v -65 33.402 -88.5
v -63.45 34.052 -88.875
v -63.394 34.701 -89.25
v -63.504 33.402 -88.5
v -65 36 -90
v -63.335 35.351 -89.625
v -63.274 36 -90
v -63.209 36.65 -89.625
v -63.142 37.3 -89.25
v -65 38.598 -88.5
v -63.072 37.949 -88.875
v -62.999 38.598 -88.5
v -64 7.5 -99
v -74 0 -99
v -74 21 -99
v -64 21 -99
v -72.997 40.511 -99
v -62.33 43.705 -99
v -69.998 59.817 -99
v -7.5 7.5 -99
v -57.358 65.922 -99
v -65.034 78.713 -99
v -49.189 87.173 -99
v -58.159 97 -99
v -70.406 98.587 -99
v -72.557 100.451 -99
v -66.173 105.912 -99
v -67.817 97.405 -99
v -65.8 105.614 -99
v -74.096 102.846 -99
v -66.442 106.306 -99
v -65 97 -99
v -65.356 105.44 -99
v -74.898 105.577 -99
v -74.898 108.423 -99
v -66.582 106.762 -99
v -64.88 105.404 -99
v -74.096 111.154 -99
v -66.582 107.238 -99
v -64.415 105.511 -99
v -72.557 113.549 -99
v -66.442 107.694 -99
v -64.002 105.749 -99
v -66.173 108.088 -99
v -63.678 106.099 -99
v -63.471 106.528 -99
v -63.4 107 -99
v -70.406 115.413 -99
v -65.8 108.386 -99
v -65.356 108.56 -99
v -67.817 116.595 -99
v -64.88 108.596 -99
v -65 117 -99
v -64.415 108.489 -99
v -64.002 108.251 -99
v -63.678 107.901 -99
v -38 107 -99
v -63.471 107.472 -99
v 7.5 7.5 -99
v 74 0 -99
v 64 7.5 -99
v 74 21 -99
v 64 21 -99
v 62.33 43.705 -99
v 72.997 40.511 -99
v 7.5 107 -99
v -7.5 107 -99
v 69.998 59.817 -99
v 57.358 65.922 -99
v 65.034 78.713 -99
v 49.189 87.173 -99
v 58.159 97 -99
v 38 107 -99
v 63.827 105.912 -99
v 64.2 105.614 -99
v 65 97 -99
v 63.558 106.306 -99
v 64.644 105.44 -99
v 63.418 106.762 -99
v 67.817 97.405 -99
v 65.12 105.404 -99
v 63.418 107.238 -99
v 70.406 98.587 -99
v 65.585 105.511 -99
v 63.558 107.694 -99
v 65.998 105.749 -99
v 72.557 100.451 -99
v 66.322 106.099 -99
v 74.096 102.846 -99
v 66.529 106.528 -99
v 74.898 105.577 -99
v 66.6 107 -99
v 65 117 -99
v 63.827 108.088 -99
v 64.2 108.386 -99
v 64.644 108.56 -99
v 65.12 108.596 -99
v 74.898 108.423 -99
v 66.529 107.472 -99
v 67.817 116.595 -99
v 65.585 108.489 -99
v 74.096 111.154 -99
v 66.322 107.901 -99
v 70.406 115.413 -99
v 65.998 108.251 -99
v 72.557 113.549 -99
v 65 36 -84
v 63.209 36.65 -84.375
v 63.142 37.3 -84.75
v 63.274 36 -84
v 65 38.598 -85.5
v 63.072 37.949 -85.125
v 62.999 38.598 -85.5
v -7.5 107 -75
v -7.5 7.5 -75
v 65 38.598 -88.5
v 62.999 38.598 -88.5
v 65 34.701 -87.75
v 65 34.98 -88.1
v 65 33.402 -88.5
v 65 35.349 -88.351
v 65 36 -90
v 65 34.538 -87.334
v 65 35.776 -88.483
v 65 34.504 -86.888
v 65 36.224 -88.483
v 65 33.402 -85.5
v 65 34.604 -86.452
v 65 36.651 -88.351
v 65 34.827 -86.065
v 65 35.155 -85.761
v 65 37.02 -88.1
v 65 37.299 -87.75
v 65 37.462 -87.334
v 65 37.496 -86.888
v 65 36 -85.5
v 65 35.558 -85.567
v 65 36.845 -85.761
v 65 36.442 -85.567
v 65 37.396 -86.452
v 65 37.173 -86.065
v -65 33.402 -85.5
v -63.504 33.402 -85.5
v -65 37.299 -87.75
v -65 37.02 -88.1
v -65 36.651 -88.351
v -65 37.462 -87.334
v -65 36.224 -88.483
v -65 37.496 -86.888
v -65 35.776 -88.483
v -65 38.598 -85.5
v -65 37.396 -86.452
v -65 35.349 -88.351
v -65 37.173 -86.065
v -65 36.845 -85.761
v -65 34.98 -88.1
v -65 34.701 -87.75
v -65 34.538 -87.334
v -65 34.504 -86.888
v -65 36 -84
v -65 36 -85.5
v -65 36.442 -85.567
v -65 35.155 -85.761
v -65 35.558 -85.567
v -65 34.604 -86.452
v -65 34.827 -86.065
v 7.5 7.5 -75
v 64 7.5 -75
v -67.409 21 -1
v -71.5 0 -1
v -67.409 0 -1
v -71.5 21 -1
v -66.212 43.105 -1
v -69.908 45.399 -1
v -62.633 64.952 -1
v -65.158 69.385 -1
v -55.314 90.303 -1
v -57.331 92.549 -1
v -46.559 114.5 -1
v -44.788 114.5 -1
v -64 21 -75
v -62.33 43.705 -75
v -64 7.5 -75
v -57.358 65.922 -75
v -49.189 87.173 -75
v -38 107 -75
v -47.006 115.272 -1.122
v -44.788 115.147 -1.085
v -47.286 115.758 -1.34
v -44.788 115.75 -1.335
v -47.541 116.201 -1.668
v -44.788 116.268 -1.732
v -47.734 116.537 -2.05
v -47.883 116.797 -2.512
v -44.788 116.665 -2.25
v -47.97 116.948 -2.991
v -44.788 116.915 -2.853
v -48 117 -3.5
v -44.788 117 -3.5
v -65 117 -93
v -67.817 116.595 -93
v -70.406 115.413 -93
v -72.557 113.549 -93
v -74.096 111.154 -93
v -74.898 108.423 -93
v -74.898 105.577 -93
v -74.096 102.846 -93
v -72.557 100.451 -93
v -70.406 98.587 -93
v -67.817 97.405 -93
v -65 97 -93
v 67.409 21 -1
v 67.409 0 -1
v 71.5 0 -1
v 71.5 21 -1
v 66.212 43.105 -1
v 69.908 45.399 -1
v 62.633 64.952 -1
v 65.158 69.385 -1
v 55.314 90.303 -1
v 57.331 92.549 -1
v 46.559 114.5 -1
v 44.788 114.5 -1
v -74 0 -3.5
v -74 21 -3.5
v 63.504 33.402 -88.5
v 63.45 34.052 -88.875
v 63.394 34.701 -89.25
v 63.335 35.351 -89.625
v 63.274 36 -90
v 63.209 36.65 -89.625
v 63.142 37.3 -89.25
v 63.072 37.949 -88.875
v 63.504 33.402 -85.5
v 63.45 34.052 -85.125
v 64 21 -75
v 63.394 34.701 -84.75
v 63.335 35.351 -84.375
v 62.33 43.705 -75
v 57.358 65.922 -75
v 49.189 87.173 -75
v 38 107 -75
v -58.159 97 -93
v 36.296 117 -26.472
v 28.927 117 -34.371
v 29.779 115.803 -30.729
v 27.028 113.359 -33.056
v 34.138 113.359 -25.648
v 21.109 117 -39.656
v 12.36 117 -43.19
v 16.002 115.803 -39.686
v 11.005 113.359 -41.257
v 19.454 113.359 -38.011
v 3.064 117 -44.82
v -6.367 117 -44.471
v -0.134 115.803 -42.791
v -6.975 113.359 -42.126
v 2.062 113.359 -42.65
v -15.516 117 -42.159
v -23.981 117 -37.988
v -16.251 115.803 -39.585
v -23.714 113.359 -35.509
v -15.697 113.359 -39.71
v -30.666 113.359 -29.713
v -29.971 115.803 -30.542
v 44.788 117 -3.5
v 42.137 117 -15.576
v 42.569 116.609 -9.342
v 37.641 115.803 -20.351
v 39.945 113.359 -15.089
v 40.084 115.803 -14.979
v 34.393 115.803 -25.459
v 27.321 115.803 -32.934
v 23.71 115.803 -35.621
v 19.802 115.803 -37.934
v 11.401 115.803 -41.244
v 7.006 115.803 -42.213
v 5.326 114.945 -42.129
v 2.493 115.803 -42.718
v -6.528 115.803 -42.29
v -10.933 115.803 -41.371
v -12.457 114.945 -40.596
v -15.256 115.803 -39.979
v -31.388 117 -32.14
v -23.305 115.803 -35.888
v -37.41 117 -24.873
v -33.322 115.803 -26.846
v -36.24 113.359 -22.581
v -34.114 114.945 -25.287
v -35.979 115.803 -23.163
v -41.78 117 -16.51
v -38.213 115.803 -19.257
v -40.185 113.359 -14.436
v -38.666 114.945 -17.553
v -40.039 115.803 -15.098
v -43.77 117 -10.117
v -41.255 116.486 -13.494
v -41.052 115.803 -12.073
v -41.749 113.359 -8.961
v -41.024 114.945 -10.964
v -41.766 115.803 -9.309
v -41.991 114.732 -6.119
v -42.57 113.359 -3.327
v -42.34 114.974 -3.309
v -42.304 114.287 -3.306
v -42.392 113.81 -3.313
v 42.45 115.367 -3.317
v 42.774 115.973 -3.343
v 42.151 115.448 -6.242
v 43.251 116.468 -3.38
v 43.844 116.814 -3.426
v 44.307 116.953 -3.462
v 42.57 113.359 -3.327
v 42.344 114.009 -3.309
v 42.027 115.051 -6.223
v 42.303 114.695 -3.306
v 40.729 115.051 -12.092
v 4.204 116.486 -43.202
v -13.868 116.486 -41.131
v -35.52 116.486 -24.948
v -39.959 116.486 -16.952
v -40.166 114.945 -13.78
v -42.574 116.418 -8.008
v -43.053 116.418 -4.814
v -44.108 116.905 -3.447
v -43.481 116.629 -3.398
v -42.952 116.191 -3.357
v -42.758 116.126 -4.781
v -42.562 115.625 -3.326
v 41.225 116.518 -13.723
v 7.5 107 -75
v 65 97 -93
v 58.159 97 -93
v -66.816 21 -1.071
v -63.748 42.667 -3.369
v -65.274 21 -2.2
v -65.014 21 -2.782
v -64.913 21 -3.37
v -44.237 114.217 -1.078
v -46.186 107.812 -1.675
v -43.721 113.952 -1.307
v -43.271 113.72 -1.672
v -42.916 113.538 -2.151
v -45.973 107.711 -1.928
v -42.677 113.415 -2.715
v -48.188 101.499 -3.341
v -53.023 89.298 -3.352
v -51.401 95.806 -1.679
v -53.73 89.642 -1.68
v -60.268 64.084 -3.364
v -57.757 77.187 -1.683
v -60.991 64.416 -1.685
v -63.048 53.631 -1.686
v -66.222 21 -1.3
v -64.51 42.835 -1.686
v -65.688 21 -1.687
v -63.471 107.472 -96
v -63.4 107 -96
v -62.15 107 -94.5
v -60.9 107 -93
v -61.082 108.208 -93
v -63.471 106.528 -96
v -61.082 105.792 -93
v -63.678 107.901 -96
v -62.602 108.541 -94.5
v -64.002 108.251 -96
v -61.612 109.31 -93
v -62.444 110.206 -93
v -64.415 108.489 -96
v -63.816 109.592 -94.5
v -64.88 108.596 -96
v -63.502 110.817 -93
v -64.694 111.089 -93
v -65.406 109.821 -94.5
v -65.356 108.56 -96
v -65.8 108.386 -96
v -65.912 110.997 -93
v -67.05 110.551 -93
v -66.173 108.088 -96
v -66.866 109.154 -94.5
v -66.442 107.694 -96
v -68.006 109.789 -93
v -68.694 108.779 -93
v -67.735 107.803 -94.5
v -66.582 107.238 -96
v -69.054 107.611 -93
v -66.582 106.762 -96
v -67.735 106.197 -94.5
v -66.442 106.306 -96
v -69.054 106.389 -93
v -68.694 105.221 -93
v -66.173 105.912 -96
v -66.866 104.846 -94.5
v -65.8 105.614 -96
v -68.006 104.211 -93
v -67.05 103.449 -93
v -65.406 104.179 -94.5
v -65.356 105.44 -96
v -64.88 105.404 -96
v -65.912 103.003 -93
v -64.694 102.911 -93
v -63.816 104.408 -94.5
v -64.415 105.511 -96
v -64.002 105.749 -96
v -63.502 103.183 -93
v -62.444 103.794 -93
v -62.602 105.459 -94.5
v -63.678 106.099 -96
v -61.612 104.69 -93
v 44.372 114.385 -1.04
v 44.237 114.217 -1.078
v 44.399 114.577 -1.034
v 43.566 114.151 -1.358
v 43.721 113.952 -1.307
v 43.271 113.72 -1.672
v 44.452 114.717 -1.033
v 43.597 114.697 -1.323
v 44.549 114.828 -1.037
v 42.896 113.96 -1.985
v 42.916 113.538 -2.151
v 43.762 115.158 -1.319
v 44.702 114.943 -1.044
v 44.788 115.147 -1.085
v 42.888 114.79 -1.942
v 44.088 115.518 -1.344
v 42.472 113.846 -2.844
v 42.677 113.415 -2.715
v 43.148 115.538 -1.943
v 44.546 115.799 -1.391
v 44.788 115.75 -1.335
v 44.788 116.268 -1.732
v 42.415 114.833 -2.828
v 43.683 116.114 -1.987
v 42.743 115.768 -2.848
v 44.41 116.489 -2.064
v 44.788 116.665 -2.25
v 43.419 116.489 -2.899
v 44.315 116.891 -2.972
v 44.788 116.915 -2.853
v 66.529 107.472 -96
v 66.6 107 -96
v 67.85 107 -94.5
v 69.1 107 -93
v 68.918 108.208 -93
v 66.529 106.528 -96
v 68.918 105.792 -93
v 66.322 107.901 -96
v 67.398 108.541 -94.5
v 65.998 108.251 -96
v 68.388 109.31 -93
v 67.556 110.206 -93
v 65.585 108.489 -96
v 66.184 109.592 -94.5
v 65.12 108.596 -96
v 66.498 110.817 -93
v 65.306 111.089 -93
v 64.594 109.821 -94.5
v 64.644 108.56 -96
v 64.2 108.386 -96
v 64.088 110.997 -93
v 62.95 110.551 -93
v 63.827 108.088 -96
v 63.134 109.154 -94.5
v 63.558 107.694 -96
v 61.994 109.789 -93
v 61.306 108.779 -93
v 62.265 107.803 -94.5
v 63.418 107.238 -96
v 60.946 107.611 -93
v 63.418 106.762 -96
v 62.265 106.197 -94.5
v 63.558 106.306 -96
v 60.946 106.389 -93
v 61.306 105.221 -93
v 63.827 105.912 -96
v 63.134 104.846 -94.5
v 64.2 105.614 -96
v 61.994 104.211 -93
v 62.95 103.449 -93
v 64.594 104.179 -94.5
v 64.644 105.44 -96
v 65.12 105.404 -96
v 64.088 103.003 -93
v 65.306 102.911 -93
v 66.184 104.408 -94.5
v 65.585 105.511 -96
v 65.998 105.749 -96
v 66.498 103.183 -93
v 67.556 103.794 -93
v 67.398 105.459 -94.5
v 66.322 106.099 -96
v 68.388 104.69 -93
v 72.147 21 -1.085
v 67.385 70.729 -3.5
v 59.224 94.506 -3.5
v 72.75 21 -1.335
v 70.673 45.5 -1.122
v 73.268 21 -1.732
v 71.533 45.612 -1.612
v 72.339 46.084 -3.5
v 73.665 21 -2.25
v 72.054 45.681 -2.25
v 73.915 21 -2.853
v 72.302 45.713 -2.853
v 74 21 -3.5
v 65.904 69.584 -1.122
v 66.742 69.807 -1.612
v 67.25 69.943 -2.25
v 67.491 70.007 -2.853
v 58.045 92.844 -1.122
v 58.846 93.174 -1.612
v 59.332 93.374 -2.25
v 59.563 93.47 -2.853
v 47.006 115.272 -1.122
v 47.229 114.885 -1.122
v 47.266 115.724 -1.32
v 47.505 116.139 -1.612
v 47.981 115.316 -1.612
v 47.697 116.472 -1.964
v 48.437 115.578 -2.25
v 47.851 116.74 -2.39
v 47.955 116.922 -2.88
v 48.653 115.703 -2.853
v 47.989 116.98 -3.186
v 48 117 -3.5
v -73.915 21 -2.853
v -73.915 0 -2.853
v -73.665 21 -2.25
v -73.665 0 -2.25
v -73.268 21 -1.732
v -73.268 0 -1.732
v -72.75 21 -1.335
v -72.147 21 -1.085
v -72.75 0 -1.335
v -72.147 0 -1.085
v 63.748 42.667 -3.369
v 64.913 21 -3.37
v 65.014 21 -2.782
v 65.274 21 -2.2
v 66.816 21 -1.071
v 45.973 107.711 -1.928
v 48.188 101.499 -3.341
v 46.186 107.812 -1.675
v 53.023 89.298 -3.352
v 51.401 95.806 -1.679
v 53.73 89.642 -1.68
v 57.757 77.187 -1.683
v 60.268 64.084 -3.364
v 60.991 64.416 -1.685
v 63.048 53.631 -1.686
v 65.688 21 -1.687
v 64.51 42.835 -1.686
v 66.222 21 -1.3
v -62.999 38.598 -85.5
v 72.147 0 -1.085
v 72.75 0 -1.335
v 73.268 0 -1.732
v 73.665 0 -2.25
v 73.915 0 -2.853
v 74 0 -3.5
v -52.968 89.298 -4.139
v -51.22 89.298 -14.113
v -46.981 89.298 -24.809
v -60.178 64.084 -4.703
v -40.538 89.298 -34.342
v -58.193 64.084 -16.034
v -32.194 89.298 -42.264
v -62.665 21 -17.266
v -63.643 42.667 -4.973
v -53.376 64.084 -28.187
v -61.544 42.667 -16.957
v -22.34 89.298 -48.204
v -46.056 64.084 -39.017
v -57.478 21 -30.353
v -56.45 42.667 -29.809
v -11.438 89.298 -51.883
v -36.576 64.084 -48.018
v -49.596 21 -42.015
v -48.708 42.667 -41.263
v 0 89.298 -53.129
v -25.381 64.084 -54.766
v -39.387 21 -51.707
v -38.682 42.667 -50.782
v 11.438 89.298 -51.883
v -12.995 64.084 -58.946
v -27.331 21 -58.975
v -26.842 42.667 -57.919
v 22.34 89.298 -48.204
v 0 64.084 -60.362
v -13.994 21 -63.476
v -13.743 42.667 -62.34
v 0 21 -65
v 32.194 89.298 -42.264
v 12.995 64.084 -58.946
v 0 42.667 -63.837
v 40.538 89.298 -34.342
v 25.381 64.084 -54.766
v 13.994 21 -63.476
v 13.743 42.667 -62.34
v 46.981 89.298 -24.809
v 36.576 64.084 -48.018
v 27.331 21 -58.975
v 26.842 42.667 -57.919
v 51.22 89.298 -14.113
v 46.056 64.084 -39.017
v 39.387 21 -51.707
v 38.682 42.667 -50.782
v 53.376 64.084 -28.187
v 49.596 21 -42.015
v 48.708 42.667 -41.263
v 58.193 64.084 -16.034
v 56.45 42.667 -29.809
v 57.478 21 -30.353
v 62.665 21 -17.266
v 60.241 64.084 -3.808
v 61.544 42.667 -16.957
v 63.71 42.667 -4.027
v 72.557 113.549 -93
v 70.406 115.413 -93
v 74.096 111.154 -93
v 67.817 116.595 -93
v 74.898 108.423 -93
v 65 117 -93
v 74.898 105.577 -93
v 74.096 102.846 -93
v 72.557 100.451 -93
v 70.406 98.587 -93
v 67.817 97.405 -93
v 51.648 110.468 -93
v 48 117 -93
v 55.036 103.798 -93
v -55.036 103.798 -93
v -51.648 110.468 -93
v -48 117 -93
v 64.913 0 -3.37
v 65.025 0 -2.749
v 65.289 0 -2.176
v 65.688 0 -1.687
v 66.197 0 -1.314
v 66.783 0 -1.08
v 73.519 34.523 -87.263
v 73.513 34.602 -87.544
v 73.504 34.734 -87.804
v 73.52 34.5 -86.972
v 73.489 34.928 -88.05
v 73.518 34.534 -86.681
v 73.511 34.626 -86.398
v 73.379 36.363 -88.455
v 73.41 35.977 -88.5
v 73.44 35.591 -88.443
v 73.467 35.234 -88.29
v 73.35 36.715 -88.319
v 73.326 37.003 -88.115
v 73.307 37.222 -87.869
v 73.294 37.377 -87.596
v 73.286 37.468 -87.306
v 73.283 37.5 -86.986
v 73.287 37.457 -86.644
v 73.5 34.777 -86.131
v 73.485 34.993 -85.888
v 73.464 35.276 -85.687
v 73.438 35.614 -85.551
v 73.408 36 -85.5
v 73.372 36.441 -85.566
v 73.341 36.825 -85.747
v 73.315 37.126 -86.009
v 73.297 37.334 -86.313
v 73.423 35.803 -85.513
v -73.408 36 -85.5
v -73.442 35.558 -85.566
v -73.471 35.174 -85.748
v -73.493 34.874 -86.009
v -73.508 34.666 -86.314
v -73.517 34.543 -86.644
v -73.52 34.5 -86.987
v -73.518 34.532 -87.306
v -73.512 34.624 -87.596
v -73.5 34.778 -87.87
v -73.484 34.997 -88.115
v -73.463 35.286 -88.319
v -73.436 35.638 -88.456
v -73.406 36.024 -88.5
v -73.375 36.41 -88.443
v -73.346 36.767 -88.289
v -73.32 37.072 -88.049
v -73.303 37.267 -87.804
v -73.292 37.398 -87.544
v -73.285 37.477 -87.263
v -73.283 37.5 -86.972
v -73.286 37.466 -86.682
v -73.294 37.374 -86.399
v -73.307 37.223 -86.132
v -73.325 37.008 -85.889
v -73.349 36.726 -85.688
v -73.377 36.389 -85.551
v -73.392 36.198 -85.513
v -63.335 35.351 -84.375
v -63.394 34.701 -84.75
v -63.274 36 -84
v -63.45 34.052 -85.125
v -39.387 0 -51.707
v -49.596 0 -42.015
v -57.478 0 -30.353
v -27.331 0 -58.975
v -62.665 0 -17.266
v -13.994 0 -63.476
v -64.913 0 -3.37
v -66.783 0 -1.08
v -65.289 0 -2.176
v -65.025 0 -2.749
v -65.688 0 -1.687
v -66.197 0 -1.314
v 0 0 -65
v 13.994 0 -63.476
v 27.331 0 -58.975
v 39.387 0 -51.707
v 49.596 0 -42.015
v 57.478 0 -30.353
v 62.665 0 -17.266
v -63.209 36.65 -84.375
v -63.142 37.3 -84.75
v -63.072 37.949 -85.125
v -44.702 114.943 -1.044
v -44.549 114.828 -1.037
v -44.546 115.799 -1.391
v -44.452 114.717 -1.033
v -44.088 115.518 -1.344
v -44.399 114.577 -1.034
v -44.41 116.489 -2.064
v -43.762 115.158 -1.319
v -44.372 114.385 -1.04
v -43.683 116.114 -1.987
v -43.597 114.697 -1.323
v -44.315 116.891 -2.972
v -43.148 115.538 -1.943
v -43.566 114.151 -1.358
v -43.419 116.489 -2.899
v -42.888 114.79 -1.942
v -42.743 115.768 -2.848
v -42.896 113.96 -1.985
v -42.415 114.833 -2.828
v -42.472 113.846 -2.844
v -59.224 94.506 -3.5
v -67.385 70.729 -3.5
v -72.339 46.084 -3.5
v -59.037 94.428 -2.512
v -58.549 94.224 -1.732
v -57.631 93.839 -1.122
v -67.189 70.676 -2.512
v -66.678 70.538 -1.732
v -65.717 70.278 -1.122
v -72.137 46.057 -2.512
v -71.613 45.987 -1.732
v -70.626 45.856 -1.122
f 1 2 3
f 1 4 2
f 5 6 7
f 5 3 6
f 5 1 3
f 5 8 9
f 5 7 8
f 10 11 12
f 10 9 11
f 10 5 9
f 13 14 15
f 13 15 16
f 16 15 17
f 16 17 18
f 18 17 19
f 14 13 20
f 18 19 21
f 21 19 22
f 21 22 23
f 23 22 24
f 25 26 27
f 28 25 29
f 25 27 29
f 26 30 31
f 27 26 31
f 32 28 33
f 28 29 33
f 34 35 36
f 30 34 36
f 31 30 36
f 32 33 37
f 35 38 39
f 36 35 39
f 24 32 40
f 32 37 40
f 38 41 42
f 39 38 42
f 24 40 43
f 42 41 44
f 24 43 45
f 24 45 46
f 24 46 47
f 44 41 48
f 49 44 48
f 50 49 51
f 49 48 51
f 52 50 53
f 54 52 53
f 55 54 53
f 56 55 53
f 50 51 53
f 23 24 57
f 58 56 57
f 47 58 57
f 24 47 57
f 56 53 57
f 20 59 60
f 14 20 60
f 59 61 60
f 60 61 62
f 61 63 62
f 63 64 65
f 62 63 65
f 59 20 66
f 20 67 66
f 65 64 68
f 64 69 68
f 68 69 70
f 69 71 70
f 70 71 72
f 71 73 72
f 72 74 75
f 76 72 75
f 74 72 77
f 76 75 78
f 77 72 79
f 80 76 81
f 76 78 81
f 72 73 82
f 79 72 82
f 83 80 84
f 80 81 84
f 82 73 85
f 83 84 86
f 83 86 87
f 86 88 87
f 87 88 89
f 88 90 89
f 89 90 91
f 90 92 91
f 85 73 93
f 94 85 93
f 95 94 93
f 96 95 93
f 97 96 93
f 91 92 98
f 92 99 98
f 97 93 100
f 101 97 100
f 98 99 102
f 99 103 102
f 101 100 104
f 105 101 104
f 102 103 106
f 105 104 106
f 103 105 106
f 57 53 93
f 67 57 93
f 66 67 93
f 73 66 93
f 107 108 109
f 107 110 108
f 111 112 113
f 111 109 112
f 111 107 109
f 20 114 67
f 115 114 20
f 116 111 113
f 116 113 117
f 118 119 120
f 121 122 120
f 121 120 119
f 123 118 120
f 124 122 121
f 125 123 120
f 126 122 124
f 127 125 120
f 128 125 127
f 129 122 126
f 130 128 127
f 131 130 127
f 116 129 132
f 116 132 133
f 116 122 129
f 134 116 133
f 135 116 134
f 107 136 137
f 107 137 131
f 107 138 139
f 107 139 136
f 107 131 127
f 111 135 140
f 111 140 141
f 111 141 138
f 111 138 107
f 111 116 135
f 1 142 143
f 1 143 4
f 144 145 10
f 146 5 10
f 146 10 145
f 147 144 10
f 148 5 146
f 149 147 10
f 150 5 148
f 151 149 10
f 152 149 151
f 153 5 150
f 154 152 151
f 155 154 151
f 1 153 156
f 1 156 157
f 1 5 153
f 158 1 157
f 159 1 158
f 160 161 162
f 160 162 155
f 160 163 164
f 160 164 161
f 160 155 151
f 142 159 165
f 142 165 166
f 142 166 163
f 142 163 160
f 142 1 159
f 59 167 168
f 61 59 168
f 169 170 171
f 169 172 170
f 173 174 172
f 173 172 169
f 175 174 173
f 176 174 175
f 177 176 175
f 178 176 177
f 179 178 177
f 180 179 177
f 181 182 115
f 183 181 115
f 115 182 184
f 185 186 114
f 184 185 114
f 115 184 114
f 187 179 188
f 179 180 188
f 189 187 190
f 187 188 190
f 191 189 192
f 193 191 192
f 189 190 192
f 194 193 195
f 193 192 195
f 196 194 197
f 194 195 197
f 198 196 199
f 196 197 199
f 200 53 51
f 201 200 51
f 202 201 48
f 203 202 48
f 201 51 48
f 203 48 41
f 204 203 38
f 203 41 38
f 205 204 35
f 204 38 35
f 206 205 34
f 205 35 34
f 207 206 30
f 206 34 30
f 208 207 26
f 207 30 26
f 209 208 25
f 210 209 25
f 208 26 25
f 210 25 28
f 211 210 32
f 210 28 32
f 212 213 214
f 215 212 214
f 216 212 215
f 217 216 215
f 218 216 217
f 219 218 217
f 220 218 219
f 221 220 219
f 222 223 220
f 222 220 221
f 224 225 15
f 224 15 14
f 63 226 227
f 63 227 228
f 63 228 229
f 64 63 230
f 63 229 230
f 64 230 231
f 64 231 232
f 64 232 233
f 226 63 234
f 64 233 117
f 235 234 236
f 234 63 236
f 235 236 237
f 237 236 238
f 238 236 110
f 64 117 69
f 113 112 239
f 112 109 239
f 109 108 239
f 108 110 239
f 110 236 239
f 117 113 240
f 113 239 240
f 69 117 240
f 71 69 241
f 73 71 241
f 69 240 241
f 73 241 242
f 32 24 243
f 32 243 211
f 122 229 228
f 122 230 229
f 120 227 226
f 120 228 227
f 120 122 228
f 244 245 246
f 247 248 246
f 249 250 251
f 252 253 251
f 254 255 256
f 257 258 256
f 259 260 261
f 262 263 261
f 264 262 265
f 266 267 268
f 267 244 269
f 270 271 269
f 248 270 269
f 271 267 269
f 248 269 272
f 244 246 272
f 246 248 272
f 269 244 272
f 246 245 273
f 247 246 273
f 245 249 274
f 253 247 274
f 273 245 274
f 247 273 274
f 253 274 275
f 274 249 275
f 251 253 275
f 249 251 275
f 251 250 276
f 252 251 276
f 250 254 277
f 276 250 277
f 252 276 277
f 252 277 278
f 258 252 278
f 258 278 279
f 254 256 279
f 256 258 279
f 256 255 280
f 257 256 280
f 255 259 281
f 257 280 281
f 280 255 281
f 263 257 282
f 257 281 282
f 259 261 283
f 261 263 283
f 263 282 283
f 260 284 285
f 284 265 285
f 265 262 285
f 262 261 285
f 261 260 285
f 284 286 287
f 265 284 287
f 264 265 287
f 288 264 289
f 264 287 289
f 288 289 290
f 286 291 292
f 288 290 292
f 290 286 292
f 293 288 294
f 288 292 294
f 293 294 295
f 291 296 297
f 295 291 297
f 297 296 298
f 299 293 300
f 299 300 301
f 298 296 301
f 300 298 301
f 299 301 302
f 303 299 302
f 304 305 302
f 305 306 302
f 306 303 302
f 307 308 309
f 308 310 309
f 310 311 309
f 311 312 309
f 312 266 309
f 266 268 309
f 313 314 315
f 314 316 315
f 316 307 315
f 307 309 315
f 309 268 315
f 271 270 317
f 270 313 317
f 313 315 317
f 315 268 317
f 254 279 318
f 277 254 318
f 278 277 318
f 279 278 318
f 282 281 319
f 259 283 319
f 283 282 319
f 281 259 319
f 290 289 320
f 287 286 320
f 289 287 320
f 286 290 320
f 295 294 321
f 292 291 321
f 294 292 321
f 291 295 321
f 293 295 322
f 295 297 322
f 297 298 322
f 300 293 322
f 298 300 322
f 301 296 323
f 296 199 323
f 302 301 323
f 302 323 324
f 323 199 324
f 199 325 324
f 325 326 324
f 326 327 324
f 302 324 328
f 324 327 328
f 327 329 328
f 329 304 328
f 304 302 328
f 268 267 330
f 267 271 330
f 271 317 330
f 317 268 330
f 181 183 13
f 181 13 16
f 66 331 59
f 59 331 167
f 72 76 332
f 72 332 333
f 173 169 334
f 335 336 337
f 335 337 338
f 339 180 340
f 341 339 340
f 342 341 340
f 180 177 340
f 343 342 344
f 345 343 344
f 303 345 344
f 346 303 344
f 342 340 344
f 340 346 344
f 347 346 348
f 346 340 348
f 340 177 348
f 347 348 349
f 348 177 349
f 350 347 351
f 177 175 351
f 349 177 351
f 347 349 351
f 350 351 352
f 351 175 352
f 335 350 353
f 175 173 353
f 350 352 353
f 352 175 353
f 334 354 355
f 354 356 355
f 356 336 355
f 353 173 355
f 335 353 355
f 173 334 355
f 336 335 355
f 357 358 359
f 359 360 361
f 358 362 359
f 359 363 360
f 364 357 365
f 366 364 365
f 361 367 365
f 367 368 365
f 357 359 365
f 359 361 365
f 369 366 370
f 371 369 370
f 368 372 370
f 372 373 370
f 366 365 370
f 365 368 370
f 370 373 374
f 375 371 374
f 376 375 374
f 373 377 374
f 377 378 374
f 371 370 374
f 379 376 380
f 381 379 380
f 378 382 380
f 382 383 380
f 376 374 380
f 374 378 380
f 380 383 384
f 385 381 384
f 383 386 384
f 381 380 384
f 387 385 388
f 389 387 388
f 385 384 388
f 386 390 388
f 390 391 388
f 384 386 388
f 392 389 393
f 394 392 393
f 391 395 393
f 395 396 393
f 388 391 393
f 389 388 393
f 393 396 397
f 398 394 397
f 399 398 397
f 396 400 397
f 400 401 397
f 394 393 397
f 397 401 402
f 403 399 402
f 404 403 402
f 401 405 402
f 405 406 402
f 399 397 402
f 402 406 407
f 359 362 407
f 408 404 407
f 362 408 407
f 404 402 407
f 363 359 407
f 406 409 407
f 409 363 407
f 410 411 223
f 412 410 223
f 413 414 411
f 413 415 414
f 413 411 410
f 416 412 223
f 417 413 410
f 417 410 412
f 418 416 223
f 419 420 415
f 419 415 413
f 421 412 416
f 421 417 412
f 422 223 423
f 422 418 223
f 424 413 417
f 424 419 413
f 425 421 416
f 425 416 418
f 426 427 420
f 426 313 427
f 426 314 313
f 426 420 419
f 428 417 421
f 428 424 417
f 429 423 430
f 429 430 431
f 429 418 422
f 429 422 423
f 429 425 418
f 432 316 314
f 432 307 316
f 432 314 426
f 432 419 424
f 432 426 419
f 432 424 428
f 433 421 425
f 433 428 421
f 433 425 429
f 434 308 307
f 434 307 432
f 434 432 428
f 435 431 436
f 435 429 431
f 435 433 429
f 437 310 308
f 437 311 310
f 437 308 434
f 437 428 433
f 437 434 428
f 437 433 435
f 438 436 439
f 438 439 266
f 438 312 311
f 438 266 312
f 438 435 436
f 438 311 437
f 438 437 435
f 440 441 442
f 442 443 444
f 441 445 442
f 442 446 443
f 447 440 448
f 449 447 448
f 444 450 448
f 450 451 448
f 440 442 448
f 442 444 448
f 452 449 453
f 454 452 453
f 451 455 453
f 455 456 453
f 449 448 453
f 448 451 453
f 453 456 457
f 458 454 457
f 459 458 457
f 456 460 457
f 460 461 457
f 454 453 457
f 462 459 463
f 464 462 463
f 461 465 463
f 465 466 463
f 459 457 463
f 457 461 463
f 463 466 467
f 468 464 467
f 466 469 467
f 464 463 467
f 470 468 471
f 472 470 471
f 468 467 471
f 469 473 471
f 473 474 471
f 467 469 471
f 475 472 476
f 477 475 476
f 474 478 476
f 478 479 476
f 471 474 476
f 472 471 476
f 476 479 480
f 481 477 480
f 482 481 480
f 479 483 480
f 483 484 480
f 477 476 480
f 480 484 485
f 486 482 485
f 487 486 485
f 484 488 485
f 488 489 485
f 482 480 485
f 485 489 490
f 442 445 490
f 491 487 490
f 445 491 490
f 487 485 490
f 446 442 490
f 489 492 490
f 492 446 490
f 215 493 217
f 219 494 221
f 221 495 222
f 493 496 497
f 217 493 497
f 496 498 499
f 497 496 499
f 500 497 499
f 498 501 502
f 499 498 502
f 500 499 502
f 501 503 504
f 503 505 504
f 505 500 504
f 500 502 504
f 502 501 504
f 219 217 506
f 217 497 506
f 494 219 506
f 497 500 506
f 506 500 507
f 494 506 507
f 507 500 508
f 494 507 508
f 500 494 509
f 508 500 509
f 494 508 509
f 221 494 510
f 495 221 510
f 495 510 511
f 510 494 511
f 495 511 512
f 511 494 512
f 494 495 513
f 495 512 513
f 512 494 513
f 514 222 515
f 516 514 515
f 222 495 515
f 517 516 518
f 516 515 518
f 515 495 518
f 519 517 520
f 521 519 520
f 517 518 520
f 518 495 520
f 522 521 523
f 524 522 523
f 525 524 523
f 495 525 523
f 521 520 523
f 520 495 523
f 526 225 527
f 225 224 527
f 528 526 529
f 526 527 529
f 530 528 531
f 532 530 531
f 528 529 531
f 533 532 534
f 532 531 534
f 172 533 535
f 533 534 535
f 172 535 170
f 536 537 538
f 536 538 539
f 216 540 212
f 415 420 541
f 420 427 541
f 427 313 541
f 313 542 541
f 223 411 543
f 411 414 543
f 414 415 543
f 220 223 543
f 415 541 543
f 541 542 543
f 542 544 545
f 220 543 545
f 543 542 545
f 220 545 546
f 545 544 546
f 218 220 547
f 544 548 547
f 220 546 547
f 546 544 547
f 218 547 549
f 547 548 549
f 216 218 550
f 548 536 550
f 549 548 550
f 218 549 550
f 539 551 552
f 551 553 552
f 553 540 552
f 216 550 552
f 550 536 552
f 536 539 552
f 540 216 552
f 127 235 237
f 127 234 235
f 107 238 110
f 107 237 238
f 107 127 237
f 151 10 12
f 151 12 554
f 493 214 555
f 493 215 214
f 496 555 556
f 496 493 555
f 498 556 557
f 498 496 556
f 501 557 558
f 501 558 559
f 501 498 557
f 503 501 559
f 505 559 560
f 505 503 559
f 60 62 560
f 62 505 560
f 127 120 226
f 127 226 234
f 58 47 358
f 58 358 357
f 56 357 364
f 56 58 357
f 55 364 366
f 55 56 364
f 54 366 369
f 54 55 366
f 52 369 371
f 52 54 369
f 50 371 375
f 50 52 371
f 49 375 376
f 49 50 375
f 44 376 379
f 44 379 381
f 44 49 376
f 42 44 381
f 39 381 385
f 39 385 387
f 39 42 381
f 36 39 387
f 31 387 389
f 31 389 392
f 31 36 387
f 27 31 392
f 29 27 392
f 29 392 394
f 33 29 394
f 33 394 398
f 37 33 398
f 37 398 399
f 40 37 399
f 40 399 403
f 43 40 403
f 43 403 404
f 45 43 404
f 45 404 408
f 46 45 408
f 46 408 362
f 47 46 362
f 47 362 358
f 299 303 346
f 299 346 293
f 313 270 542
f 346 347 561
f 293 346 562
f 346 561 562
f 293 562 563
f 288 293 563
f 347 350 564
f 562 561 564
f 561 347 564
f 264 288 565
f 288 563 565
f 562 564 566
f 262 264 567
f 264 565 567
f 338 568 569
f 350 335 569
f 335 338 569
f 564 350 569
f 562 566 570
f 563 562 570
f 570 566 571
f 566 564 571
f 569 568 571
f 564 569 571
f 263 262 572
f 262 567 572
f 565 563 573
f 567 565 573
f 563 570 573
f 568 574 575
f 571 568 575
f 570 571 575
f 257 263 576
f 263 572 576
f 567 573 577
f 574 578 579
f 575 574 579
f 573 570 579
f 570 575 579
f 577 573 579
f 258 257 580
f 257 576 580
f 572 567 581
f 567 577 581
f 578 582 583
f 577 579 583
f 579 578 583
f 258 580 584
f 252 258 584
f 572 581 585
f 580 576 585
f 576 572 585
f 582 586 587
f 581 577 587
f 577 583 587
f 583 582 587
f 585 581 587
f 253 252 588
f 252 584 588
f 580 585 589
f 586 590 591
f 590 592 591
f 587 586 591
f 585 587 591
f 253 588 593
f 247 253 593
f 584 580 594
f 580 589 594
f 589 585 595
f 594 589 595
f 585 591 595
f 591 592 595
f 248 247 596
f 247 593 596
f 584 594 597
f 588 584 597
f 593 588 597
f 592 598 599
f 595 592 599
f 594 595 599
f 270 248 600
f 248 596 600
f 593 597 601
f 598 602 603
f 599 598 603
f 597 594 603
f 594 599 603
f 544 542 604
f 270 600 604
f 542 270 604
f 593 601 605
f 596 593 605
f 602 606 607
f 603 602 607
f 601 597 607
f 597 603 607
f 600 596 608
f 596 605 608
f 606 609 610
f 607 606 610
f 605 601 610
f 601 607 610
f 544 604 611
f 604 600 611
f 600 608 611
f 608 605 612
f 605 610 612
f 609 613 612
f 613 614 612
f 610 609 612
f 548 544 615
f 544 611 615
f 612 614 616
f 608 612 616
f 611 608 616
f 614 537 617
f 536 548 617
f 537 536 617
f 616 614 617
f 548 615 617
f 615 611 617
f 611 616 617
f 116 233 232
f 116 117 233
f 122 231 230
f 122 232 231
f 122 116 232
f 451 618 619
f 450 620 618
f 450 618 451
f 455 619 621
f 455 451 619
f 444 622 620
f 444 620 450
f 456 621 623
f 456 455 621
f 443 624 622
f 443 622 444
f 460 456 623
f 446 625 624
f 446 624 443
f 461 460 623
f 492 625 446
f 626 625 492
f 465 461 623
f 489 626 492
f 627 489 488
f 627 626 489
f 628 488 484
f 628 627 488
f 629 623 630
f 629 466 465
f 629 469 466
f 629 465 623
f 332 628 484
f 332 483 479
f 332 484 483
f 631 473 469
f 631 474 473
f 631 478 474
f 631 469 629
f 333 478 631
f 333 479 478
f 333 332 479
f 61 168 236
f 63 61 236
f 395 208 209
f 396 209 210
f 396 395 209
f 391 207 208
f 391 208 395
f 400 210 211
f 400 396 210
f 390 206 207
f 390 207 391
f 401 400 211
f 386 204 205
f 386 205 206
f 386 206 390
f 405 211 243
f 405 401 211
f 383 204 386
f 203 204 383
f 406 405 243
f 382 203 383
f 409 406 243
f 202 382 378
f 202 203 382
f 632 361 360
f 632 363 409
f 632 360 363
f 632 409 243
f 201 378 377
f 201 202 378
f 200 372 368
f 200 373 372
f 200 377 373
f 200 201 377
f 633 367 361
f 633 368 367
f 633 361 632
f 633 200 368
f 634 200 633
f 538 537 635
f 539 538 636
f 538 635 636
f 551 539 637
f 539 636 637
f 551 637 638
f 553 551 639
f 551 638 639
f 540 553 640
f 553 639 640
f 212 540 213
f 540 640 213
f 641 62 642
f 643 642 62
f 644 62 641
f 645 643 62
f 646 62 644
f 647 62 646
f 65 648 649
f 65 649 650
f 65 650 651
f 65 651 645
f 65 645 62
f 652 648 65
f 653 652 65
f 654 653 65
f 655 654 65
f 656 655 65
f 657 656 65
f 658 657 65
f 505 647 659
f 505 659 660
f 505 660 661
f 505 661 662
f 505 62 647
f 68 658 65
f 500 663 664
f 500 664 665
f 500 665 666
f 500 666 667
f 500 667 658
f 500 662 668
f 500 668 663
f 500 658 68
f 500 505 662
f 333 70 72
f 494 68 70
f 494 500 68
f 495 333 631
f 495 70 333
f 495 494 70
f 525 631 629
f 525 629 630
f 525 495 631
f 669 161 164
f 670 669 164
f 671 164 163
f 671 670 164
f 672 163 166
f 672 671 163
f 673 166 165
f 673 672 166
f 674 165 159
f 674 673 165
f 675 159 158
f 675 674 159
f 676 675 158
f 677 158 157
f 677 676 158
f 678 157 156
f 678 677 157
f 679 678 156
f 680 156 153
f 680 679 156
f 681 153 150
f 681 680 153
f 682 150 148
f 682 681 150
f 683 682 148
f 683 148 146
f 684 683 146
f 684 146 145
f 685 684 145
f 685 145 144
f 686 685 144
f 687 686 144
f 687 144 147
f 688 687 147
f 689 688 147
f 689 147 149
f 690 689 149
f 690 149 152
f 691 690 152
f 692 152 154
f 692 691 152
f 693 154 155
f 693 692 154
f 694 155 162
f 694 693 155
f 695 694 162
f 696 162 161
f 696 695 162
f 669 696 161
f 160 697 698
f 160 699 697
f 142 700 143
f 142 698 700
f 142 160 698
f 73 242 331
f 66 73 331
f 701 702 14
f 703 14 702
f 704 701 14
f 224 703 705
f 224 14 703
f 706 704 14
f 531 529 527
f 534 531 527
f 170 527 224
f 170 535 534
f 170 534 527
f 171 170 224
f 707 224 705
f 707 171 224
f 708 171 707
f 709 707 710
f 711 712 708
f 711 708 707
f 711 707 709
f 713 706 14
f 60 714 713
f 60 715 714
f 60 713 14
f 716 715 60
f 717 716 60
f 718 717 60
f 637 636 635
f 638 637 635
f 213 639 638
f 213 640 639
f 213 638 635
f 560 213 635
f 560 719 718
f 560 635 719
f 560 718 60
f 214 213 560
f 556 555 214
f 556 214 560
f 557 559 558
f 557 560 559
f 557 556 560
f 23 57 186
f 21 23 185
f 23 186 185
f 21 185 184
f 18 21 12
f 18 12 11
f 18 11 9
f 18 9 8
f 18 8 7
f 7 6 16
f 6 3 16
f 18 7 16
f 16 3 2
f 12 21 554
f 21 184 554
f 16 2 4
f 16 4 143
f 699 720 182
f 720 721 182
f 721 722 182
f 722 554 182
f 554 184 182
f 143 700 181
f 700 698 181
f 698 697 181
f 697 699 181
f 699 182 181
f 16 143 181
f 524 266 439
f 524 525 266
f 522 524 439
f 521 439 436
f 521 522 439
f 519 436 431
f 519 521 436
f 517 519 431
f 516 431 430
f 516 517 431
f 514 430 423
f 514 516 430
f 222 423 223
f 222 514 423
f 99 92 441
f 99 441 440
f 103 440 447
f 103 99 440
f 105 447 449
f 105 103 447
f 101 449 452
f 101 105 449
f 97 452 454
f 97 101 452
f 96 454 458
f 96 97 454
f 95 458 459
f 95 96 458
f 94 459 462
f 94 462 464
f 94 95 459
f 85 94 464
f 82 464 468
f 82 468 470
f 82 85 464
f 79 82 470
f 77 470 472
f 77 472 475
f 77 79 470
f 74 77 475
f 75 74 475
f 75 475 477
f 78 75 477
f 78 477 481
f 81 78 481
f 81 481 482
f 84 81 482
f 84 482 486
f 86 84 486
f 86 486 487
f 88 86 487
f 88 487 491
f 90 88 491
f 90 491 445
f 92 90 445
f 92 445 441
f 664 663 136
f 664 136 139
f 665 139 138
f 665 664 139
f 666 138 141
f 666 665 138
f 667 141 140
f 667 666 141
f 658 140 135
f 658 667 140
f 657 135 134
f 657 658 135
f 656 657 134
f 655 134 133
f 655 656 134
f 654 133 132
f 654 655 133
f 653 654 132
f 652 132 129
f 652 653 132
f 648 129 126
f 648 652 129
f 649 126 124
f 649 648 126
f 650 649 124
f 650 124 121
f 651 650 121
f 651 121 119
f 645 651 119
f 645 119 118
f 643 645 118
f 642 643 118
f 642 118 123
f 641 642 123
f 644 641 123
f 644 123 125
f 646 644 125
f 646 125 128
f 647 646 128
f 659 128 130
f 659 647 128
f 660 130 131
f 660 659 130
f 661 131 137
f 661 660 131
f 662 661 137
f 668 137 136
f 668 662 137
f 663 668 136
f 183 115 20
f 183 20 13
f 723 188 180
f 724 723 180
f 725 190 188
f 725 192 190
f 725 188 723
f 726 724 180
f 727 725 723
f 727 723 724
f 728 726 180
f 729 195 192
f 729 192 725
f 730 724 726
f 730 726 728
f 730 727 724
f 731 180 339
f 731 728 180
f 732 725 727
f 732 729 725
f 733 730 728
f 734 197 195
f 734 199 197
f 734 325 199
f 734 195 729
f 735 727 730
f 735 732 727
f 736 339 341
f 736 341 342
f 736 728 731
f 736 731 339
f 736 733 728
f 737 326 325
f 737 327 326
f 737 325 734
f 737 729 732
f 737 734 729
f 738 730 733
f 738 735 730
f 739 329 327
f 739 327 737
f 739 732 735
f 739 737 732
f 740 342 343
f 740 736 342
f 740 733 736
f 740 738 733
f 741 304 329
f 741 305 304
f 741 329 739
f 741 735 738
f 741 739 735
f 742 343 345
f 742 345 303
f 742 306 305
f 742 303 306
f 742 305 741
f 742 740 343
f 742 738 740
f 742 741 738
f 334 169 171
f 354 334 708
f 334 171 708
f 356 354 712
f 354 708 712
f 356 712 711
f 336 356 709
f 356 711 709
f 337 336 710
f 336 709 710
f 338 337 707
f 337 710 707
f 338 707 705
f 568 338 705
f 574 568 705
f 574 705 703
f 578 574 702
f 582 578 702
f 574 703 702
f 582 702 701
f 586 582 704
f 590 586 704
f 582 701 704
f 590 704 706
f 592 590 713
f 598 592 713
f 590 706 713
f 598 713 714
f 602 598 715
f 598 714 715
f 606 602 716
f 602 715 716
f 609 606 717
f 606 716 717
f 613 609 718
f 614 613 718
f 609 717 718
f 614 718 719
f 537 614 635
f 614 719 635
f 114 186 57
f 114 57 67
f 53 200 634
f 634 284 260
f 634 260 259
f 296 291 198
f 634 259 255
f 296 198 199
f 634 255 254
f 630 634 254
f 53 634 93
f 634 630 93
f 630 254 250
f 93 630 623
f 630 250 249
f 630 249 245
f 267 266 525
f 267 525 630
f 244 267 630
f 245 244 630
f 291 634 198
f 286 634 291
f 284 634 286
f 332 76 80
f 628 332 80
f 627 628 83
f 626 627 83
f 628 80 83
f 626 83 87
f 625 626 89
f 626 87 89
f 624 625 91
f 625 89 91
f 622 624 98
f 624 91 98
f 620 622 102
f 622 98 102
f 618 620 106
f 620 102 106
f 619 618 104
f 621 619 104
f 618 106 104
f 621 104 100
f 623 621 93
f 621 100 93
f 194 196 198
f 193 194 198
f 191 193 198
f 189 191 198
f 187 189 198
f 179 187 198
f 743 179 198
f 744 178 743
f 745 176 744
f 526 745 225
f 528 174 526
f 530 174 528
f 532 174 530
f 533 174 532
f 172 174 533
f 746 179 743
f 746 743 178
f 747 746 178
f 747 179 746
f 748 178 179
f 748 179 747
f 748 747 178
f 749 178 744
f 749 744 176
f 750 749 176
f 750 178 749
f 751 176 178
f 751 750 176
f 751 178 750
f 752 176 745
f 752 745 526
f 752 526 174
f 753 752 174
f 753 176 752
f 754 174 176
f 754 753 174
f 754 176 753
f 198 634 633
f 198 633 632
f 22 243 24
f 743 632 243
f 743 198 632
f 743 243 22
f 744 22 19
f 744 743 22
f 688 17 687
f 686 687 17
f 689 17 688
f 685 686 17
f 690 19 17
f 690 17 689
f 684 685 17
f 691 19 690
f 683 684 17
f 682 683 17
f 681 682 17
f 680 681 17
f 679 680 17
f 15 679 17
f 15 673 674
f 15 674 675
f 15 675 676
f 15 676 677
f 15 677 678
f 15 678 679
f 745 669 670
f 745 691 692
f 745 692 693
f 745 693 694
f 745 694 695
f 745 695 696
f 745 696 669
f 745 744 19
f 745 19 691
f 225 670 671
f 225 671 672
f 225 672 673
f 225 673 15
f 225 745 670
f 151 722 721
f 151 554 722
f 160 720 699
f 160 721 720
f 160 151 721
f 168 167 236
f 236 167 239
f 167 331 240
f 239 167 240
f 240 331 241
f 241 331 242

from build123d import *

# Parameters (mm, degrees)
CYLINDER063_R              = 1.6
CYLINDER063_DEPTH          = 10
EXTRUDE027_DEPTH           = 6
EXTRUDE030_DEPTH           = 6
EXTRUDE030_PLACEMENT_ANGLE = 180
CYLINDER072_R              = 1.5
CYLINDER072_DEPTH          = 45
PRISM011_DEPTH             = 3
CYLINDER071_R              = 3
CYLINDER071_DEPTH          = 5
FUSION063_PLACEMENT_ANGLE  = 180
CYLINDER070_R              = 1.5
CYLINDER070_DEPTH          = 45
PRISM010_DEPTH             = 3
CYLINDER068_R              = 3
CYLINDER068_DEPTH          = 5
EXTRUDE026_DEPTH           = 24
REVOLVE001_ANGLE           = 180
EXTRUDE025_DEPTH           = 74
FILLET004_R                = 2.5


with BuildPart() as cono003:
    # Cone003 → Cone003 (revolve)
    with BuildSketch(Plane(origin=(0, 0, -96), x_dir=(1, 0, 0), z_dir=(0, -1, 0))):
        Polygon((0, 0), (1.6, 0), (4.1, 3), (0, 3), align=None)
    revolve(axis=Axis((0, 0, -96), (0, 0, 1)))


with BuildPart() as cilindro063:
    # Cylinder063 → Cylinder063 (new body)
    with BuildSketch(Plane.XY.offset(-106)):
        Circle(CYLINDER063_R)
    extrude(amount=CYLINDER063_DEPTH)


with BuildPart() as fusion058:
    # Fusion058 base: copy of Cilindro063
    add(cilindro063.part)

    # Fusion058: union Cono003
    add(cono003.part)


with BuildPart() as fusion058_1:
    # Fusion058 placement: moved
    add(fusion058.part.moved(Location((65, 107, 0))))


with BuildPart() as fusion059:
    # Fusion057 base: copy of Cilindro063
    add(cilindro063.part)

    # Fusion057: union Cono003
    add(cono003.part)


with BuildPart() as fusion059_1:
    # Fusion057 placement: moved
    add(fusion059.part.moved(Location((-65, 107, 0))))

    # Fusion059: union Fusion058
    add(fusion058_1.part)


with BuildPart() as extrude027:
    # Sketch020 → Extrude027 (new body)
    with BuildSketch(Plane.XY.offset(-99)):
        with BuildLine():
            ThreePointArc((0, 10), (-10, 0), (0, -10))
            Line((20, -10), (0, -10))
            Line((20, 10), (20, -10))
            Line((0, 10), (20, 10))
        make_face()
    extrude(amount=EXTRUDE027_DEPTH)


with BuildPart() as extrude027_1:
    # Extrude027 placement: moved
    add(extrude027.part.moved(Location((-65, 107, 0))))


with BuildPart() as cut022:
    # Sketch020 → Extrude030 (new body)
    with BuildSketch(Plane.XY.offset(-99)):
        with BuildLine():
            ThreePointArc((0, 10), (-10, 0), (0, -10))
            Line((20, -10), (0, -10))
            Line((20, 10), (20, -10))
            Line((0, 10), (20, 10))
        make_face()
    extrude(amount=EXTRUDE030_DEPTH)


with BuildPart() as cut022_1:
    # Extrude030 placement: moved
    add(cut022.part.moved(Location((65, 107, 0))).rotate(Axis((65, 107, 0), (0, 0, 1)), EXTRUDE030_PLACEMENT_ANGLE))

    # Fusion055: union Extrude027
    add(extrude027_1.part)

    # Cut022: cut Fusion059
    add(fusion059_1.part, mode=Mode.SUBTRACT)


with BuildPart() as cilindro072:
    # Cylinder072 → Cylinder072 (new body)
    with BuildSketch(Plane(origin=(33, 0, -87), x_dir=(0, 0, 1), z_dir=(-1, 0, 0))):
        Circle(CYLINDER072_R)
    extrude(amount=CYLINDER072_DEPTH)


with BuildPart() as prisma011:
    # Prism011 → Prism011 (new body)
    with BuildSketch(Plane(origin=(0, 0, -87), x_dir=(0, 0, 1), z_dir=(-1, 0, 0))):
        Polygon((3, 0), (1.5, 2.598076), (-1.5, 2.598076), (-3, 0), (-1.5, -2.598076), (1.5, -2.598076), align=None)
    extrude(amount=PRISM011_DEPTH)


with BuildPart() as fusion063:
    # Cylinder071 → Cylinder071 (new body)
    with BuildSketch(Plane(origin=(24, 0, -87), x_dir=(0, 0, 1), z_dir=(-1, 0, 0))):
        Circle(CYLINDER071_R)
    extrude(amount=CYLINDER071_DEPTH)

    # Fusion063: union Cilindro072, Prisma011
    add(cilindro072.part)
    add(prisma011.part)


with BuildPart() as fusion063_1:
    # Fusion063 placement: moved
    add(fusion063.part.moved(Location((-65, 36, 0))).rotate(Axis((-65, 36, 0), (0, 0, 1)), FUSION063_PLACEMENT_ANGLE))


with BuildPart() as cilindro070:
    # Cylinder070 → Cylinder070 (new body)
    with BuildSketch(Plane(origin=(98, 36, -87), x_dir=(0, 0, 1), z_dir=(-1, 0, 0))):
        Circle(CYLINDER070_R)
    extrude(amount=CYLINDER070_DEPTH)


with BuildPart() as prisma010:
    # Prism010 → Prism010 (new body)
    with BuildSketch(Plane(origin=(65, 36, -87), x_dir=(0, 0, 1), z_dir=(-1, 0, 0))):
        Polygon((3, 0), (1.5, 2.598076), (-1.5, 2.598076), (-3, 0), (-1.5, -2.598076), (1.5, -2.598076), align=None)
    extrude(amount=PRISM010_DEPTH)


with BuildPart() as fusion061:
    # Cylinder068 → Cylinder068 (new body)
    with BuildSketch(Plane(origin=(89, 36, -87), x_dir=(0, 0, 1), z_dir=(-1, 0, 0))):
        Circle(CYLINDER068_R)
    extrude(amount=CYLINDER068_DEPTH)

    # Fusion062: union Cilindro070, Prisma010
    add(cilindro070.part)
    add(prisma010.part)

    # Fusion061: union Fusion063
    add(fusion063_1.part)


with BuildPart() as cut023:
    # Sketch019 → Extrude026 (new body)
    with BuildSketch(Plane.XY.offset(-75)):
        with BuildLine():
            ThreePointArc((-48, 117), (-67.384986, 70.729267), (-74, 21))
            Line((-74, 21), (-74, 0))
            Line((-74, 0), (74, 0))
            Line((74, 21), (74, 0))
            ThreePointArc((74, 21), (67.384986, 70.729267), (48, 117))
            Line((-48, 117), (48, 117))
        make_face()
        with BuildLine():
            Line((-38, 107), (-7.5, 107))
            Line((-7.5, 107), (-7.5, 7.5))
            Line((-7.5, 7.5), (-64, 7.5))
            Line((-64, 7.5), (-64, 21))
            ThreePointArc((-38, 107), (-57.357897, 65.922155), (-64, 21))
        make_face(mode=Mode.SUBTRACT)
        with BuildLine():
            Line((7.5, 107), (7.5, 7.5))
            Line((7.5, 7.5), (64, 7.5))
            Line((64, 7.5), (64, 21))
            ThreePointArc((64, 21), (57.357897, 65.922155), (38, 107))
            Line((38, 107), (7.5, 107))
        make_face(mode=Mode.SUBTRACT)
    extrude(amount=-EXTRUDE026_DEPTH)

    # Cut023: cut Fusion061
    add(fusion061.part, mode=Mode.SUBTRACT)


with BuildPart() as revolve001:
    # Sketch017 → Revolve001 (revolve)
    with BuildSketch(Plane.XY):
        with BuildLine():
            Line((-65, 21), (-65, -21))
            ThreePointArc((-65, -21), (-58.133531, -73.27332), (-38, -122))
            Line((-38, -122), (0, -122))
            Line((0, 122), (0, -122))
            Line((0, 122), (-38, 122))
            ThreePointArc((-38, 122), (-58.133531, 73.27332), (-65, 21))
        make_face()
    revolve(axis=Axis((0, 0, 0), (0, -1, 0)), revolution_arc=REVOLVE001_ANGLE)


with BuildPart() as soporte_balon001:
    # Sketch018 → Extrude025 (new body)
    with BuildSketch(Plane.XY):
        with BuildLine():
            Line((-74, 21), (-74, 0))
            Line((-74, 0), (74, 0))
            Line((74, 21), (74, 0))
            ThreePointArc((74, 21), (67.384986, 70.729267), (48, 117))
            Line((-48, 117), (48, 117))
            ThreePointArc((-48, 117), (-67.384986, 70.729267), (-74, 21))
        make_face()
    extrude(amount=-EXTRUDE025_DEPTH)


with BuildPart() as soporte_balon001_1:
    # Extrude025 placement: moved
    add(soporte_balon001.part.moved(Location((0, 0, -1))))

    # Cut021: cut Revolve001
    add(revolve001.part, mode=Mode.SUBTRACT)

    # Fillet004
    fillet004_edges = [soporte_balon001_1.edges().sort_by_distance(p)[0] for p in [
        (67.384986, 70.729267, -1),
        (74, 10.5, -1),
        (44.386684, 117, -1),
        (0, 117, -40.78563),
        (-44.386684, 117, -1),
        (64.992307, 10.5, -1),
        (58.844411, 70.504014, -1),
        (-58.844411, 70.504014, -1),
        (-64.992307, 10.5, -1),
        (-74, 10.5, -1),
        (-67.384986, 70.729267, -1),
    ]]
    fillet(fillet004_edges, radius=FILLET004_R)

    # Fusion060: union Cut022, Cut023
    add(cut022_1.part)
    add(cut023.part)


solid = soporte_balon001_1.part
